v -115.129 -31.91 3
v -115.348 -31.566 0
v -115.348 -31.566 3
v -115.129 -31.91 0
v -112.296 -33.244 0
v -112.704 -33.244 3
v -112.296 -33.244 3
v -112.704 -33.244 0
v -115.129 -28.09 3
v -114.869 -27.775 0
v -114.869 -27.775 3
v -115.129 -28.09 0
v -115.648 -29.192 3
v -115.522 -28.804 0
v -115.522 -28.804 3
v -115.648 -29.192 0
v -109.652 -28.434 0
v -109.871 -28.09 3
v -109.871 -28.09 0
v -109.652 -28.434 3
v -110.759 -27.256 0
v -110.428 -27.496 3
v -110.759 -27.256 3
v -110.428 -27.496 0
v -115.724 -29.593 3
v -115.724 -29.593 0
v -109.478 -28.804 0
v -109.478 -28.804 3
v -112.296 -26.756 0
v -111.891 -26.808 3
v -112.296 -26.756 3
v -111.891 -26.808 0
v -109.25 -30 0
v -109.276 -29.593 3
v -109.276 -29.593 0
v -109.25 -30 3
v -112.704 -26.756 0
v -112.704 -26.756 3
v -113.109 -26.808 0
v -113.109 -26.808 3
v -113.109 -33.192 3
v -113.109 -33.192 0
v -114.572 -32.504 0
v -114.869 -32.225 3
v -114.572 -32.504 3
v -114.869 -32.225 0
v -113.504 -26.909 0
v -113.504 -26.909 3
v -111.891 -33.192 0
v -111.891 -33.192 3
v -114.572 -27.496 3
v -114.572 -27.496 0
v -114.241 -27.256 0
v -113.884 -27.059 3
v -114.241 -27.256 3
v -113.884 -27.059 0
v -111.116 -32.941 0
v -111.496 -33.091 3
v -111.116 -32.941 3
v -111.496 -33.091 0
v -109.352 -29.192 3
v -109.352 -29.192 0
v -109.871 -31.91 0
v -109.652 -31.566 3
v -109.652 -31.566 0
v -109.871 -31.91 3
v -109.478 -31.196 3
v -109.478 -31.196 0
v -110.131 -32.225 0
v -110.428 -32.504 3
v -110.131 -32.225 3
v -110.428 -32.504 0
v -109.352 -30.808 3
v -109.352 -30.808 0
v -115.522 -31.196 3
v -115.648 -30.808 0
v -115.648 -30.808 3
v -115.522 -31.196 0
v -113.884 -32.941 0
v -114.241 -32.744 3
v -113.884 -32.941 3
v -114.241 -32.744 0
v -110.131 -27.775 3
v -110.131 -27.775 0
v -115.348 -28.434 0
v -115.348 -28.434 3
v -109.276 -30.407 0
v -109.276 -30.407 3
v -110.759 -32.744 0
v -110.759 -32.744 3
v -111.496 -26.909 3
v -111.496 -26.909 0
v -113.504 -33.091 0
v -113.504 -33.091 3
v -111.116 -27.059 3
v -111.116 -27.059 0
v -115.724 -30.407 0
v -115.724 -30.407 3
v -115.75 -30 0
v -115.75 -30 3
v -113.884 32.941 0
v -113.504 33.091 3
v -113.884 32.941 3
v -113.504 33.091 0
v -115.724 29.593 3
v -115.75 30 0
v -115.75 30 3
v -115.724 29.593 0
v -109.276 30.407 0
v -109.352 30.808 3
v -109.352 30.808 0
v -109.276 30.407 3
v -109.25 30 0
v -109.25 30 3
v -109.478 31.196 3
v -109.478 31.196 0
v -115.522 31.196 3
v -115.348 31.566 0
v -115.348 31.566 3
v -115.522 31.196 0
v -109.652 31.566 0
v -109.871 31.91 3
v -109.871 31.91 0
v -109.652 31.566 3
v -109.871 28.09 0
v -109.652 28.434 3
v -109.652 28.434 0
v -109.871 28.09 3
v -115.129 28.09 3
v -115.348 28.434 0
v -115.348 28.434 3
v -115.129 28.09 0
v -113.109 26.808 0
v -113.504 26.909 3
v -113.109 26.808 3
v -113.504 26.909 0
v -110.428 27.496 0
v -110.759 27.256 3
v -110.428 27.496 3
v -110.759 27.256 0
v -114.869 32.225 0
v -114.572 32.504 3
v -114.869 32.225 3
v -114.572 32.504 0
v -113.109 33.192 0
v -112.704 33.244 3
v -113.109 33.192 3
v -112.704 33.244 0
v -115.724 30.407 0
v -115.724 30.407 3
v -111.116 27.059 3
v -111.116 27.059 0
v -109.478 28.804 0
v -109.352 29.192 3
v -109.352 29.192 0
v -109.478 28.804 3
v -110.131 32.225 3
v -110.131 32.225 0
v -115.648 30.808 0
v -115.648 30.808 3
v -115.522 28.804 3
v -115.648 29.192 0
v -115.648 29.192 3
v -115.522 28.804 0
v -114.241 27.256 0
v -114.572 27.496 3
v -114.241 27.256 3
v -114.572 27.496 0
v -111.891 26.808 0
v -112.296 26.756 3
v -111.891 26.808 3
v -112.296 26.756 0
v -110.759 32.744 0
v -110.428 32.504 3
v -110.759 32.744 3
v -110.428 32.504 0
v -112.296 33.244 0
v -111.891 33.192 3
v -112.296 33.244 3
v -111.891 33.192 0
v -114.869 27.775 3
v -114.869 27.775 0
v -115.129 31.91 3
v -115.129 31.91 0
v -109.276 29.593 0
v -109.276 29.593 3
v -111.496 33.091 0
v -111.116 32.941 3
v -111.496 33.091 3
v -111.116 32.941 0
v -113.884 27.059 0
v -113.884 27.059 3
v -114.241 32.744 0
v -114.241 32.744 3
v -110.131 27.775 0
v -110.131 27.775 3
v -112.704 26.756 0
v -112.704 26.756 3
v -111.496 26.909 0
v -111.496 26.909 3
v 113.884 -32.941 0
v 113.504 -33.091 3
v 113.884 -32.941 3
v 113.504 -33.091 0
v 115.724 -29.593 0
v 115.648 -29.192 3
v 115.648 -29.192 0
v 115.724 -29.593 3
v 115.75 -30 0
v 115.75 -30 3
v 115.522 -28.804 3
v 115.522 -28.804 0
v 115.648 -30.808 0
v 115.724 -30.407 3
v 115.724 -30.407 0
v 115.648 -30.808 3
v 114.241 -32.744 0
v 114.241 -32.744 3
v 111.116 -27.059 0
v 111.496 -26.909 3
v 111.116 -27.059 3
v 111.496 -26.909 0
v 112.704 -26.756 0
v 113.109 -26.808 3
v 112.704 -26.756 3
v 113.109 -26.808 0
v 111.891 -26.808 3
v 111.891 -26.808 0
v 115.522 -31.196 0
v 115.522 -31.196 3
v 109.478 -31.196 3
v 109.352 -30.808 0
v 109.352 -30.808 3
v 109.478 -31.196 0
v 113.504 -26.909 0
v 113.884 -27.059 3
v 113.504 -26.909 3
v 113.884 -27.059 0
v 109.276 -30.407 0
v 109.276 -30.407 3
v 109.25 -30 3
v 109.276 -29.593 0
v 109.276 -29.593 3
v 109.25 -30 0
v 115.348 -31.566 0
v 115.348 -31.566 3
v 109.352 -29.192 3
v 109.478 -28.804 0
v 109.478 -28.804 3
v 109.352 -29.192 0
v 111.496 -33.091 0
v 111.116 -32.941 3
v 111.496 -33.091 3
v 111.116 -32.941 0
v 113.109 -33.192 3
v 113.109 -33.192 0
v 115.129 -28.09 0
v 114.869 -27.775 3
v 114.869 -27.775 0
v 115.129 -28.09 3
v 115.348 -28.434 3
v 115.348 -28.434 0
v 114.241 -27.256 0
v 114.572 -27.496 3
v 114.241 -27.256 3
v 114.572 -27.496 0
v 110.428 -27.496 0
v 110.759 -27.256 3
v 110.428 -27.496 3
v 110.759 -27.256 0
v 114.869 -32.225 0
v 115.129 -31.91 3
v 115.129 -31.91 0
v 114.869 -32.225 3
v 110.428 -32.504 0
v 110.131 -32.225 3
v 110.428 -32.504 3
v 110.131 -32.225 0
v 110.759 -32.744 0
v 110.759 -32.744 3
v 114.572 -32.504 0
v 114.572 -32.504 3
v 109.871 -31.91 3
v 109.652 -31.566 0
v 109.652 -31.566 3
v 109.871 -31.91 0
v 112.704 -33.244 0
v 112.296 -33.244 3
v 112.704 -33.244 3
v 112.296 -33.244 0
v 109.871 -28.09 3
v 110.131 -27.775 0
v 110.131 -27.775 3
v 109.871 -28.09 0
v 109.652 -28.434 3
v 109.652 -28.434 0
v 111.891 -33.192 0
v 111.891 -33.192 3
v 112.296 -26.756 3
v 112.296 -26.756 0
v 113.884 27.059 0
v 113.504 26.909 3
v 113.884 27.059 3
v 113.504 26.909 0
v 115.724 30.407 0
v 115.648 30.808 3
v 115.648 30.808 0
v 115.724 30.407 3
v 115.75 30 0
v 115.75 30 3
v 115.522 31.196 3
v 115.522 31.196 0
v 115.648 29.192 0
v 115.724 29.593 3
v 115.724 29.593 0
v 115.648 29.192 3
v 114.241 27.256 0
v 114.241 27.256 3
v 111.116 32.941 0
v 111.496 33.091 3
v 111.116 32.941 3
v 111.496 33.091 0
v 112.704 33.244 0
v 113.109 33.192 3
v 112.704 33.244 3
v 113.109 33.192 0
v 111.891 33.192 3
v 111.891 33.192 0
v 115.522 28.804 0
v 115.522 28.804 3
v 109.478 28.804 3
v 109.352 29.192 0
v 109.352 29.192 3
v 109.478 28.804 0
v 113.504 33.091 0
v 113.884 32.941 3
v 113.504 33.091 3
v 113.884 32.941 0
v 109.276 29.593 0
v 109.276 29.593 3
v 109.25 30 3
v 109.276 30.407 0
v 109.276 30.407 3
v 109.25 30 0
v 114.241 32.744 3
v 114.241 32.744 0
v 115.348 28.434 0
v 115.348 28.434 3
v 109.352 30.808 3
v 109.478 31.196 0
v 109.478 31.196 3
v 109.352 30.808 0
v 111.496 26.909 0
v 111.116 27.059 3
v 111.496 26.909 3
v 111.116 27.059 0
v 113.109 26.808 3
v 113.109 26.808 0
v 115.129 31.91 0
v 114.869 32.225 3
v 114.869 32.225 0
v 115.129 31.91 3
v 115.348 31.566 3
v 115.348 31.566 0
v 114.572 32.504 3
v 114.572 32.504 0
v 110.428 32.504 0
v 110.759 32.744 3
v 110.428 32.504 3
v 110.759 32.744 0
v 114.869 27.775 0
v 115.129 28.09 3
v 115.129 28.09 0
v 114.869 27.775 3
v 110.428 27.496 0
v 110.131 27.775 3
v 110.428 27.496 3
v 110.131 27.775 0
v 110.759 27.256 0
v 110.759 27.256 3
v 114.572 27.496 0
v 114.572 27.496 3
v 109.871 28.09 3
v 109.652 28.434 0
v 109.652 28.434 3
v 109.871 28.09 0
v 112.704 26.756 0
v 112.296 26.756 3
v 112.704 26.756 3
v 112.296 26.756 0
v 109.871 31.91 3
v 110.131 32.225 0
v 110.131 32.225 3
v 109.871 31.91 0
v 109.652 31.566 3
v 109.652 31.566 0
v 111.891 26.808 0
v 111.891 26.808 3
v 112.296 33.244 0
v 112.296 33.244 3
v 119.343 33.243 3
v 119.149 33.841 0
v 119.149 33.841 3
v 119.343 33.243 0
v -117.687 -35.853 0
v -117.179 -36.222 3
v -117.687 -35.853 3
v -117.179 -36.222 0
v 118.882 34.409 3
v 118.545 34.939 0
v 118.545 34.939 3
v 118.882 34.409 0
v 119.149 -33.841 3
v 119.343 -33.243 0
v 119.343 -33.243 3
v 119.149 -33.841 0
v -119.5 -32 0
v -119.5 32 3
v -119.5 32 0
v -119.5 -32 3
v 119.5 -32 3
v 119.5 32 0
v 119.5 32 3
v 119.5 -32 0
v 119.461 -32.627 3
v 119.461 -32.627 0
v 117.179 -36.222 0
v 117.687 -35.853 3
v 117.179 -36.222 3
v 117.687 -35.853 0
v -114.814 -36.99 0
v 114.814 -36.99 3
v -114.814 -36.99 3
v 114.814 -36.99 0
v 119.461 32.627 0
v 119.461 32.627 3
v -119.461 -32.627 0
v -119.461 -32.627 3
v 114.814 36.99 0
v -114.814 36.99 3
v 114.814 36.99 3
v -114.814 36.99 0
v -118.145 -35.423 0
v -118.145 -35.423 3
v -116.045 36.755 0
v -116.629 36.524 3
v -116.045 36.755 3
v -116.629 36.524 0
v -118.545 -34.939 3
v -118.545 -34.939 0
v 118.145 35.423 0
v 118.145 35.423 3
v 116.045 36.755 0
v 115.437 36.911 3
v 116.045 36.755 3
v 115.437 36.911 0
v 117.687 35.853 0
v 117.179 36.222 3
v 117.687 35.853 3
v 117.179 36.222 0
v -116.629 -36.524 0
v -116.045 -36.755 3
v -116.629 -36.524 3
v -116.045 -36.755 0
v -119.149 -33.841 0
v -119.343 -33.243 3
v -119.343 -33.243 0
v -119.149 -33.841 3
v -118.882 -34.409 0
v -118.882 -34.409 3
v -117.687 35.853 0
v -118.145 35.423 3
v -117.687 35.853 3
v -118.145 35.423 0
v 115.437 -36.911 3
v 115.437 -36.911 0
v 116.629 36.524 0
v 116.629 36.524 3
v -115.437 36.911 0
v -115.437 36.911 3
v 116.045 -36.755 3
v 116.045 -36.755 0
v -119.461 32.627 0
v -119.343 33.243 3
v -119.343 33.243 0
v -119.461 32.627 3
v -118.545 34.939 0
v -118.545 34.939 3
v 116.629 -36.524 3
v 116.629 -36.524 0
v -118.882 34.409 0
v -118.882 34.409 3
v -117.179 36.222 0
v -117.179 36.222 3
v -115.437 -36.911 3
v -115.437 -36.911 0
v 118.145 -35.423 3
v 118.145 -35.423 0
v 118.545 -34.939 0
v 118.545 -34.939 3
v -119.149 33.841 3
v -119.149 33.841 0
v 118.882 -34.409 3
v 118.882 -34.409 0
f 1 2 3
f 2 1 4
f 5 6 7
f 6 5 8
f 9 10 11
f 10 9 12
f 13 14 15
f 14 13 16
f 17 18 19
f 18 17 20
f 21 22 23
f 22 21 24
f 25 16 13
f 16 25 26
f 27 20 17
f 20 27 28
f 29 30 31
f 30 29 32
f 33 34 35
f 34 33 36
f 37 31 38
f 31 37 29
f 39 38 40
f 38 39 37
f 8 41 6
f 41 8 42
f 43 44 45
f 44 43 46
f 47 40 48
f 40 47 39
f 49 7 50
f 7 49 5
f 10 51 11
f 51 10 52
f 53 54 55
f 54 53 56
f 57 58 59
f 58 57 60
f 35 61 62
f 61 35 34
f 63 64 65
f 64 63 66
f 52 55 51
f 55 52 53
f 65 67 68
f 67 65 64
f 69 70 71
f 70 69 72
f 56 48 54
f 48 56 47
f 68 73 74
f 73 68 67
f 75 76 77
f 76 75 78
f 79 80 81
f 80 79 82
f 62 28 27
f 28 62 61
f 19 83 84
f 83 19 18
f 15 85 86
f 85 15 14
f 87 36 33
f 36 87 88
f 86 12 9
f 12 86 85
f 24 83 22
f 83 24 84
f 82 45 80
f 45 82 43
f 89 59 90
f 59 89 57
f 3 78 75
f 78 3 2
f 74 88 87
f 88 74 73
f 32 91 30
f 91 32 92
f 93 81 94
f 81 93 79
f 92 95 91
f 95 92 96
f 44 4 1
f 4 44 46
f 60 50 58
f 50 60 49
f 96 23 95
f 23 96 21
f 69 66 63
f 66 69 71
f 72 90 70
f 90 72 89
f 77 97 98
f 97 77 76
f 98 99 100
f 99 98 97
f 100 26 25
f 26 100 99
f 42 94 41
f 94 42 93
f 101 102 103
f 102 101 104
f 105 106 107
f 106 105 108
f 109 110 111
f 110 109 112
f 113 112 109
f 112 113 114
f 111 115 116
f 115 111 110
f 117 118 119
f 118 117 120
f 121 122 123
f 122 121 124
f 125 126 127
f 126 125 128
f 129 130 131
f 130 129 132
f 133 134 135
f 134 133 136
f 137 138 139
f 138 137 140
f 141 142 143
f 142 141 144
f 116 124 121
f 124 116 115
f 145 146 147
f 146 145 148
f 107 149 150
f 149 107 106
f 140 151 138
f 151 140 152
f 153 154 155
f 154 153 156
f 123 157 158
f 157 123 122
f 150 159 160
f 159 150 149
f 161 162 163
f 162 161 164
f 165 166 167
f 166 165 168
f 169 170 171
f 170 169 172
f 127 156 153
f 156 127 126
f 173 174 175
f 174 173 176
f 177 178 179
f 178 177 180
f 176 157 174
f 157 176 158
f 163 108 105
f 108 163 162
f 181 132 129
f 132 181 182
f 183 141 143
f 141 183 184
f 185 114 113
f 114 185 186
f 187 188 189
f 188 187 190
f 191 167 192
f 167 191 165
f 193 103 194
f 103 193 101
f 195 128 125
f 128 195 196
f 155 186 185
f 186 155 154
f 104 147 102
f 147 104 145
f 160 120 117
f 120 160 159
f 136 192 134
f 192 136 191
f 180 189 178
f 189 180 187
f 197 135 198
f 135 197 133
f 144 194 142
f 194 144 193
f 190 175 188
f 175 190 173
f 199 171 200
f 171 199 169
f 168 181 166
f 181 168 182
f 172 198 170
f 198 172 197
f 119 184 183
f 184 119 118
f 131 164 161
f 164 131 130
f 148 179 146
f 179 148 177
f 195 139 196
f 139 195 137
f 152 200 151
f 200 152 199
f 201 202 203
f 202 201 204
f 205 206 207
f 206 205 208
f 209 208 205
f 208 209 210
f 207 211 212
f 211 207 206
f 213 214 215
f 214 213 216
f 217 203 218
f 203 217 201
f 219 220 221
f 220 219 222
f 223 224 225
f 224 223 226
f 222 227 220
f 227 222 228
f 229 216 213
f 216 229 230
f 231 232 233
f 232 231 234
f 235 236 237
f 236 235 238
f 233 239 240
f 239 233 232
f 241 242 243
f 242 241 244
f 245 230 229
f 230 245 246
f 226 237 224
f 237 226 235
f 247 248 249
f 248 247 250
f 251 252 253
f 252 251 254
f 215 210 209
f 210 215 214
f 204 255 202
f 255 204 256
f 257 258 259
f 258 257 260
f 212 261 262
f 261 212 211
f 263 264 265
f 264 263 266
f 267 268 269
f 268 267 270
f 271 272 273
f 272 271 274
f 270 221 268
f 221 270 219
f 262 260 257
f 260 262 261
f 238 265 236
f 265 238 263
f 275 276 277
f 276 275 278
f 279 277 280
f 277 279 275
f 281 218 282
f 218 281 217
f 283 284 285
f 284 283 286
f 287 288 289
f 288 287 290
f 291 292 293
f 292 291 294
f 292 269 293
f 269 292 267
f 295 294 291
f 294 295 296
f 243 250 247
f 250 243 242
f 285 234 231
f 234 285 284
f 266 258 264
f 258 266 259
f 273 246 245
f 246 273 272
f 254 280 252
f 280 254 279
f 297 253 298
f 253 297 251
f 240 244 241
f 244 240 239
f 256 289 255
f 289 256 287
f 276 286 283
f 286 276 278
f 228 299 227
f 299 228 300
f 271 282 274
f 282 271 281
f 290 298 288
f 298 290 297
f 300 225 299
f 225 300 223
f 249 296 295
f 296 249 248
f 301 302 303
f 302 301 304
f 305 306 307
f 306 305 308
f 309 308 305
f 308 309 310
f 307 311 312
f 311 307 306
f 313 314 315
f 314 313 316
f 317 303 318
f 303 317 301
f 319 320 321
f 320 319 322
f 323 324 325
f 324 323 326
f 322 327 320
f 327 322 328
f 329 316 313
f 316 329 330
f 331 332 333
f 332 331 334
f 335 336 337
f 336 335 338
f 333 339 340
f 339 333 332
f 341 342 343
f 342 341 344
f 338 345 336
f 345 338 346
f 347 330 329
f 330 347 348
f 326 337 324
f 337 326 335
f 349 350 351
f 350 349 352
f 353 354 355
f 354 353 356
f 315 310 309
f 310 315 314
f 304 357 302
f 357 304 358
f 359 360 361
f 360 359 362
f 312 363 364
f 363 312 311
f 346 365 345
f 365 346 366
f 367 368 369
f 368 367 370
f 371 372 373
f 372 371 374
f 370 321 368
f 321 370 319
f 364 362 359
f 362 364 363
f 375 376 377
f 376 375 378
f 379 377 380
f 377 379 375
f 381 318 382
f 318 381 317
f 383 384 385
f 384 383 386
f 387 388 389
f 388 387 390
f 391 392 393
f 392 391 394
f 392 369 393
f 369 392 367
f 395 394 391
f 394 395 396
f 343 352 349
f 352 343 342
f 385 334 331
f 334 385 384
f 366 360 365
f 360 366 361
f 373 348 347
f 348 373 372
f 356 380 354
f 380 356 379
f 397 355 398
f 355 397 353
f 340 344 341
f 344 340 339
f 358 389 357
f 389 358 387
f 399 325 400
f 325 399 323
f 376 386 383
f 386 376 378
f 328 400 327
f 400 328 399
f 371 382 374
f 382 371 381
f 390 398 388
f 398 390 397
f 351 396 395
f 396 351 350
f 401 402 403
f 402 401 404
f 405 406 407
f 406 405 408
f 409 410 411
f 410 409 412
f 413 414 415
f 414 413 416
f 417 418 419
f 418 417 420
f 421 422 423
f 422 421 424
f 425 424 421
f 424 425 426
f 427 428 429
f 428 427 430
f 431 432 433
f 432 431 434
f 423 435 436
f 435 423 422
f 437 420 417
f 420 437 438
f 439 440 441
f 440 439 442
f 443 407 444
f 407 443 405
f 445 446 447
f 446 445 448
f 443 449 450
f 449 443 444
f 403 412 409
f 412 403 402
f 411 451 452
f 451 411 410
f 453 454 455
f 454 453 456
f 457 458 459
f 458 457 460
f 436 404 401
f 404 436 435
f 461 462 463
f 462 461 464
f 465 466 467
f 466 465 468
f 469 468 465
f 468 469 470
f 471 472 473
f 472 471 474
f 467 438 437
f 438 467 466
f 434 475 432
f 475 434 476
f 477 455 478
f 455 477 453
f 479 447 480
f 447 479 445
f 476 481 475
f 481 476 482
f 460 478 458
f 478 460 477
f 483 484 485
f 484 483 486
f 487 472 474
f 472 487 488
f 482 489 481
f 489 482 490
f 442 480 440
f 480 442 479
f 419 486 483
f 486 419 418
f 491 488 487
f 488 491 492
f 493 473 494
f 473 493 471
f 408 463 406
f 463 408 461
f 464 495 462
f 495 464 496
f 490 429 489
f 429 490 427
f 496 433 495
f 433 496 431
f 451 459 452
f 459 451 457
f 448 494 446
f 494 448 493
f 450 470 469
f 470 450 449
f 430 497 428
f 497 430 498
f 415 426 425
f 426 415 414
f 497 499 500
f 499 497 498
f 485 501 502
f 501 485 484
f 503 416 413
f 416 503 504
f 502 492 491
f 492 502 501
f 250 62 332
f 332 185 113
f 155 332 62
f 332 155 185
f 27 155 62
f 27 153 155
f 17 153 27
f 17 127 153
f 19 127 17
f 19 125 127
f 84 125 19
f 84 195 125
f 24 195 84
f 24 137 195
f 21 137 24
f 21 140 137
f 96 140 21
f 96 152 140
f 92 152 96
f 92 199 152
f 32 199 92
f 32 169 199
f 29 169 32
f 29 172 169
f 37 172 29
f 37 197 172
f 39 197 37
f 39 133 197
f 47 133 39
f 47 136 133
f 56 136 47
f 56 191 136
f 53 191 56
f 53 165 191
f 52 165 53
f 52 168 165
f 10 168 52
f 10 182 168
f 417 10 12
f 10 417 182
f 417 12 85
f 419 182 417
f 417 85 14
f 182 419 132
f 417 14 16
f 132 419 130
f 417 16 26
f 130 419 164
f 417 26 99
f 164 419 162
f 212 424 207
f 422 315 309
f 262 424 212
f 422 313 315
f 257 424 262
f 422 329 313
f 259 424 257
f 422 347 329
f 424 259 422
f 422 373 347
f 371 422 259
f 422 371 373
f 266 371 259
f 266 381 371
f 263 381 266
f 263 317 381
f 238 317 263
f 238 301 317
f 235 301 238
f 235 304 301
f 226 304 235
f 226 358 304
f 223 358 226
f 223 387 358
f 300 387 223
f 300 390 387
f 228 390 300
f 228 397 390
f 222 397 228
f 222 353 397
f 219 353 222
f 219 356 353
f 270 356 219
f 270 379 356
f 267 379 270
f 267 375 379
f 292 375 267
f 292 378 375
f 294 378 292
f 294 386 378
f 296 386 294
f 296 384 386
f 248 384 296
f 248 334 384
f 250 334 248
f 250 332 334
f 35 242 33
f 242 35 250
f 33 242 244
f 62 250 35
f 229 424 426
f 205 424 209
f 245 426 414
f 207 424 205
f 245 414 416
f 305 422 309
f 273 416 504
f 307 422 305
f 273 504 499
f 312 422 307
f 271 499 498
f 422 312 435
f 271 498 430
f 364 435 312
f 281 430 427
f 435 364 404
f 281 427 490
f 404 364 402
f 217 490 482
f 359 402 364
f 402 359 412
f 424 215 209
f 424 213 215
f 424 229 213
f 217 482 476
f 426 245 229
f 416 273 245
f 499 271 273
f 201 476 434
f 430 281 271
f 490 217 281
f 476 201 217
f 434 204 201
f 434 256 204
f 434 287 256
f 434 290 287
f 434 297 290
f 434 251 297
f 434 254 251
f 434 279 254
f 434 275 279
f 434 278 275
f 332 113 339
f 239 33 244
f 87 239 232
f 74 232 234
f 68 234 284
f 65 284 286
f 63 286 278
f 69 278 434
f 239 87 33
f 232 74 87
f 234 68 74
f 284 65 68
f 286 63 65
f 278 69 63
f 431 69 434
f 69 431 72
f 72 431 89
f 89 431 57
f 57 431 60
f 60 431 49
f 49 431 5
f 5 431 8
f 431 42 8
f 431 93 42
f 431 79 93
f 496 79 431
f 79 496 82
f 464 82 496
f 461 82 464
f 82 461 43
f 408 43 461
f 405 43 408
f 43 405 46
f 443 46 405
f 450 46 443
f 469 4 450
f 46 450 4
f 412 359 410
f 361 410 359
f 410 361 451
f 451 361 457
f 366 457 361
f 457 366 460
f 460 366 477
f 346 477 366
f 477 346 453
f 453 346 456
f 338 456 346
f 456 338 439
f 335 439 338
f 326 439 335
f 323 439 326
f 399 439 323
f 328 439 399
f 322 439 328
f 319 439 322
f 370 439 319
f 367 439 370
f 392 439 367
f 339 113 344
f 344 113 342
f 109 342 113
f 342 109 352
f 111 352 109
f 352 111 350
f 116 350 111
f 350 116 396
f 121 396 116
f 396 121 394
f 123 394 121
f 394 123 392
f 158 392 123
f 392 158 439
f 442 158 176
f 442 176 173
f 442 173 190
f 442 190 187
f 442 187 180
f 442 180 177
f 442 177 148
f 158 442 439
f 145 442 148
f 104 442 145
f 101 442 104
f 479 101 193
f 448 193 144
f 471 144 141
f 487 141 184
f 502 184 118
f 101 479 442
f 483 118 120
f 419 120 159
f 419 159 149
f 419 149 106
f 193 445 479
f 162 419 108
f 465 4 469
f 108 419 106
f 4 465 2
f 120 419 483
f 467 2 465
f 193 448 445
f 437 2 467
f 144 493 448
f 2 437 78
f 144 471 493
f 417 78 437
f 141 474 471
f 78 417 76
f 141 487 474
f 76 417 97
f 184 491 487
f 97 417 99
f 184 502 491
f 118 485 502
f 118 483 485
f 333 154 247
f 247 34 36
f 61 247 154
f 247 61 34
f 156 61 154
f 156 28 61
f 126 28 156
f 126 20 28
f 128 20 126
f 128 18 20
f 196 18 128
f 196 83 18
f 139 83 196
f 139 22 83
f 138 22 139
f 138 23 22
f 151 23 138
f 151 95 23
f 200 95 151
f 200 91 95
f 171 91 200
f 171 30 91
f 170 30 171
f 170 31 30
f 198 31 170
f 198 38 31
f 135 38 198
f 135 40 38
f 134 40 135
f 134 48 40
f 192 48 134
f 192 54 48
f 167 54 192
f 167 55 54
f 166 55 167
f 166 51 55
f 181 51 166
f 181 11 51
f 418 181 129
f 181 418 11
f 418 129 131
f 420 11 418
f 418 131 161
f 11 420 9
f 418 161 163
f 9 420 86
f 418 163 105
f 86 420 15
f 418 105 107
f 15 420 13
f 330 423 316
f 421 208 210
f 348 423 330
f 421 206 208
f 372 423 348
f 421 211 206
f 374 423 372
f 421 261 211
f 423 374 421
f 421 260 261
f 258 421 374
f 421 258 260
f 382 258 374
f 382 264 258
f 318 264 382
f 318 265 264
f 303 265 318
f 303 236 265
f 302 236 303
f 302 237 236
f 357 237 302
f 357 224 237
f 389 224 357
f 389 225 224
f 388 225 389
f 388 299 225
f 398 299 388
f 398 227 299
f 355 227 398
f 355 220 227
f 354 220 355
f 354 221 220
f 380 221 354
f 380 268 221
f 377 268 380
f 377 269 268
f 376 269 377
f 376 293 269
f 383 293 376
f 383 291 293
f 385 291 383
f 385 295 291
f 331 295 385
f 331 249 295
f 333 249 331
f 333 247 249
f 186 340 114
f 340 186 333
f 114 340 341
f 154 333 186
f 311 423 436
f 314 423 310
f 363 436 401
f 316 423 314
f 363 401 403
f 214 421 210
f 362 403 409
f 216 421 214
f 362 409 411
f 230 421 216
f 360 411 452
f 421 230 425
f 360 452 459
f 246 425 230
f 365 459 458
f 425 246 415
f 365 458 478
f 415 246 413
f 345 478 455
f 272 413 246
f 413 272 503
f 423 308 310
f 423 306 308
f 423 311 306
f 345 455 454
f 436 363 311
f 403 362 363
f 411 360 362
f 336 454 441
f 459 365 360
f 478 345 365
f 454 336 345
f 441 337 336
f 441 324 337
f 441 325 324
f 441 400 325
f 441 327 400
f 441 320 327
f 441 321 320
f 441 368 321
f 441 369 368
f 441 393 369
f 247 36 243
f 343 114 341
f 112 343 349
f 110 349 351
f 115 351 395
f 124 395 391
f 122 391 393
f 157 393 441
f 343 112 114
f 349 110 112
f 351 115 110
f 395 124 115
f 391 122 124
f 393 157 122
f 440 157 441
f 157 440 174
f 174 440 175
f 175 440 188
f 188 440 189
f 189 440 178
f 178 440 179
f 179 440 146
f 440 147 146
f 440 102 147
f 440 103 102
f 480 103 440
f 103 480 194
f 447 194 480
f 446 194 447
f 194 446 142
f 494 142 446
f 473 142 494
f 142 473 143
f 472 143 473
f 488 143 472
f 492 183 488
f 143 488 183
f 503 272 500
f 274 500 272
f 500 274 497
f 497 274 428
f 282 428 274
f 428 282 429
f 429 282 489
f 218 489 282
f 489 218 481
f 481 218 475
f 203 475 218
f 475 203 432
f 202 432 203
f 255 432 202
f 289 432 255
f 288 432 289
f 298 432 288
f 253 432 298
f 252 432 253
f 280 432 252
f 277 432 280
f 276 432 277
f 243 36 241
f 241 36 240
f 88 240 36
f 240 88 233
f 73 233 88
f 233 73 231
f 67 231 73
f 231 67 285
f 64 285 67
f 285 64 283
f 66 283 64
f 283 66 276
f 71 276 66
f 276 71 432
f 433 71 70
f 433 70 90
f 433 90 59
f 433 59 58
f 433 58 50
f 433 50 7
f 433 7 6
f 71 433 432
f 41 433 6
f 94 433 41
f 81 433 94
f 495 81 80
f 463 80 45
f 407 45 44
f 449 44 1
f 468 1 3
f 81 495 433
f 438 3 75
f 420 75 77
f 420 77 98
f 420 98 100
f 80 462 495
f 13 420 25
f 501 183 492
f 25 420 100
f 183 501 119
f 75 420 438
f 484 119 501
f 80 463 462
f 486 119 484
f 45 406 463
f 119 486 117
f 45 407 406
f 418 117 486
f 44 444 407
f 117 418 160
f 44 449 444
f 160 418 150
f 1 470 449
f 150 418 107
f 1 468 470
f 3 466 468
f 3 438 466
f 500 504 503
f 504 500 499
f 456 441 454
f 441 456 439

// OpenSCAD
$fn = 50;


difference() {
	union() {
		hull() {
			translate(v = [-114.5000000000, 32.0000000000, 0]) {
				cylinder(h = 3, r = 5);
			}
			translate(v = [114.5000000000, 32.0000000000, 0]) {
				cylinder(h = 3, r = 5);
			}
			translate(v = [-114.5000000000, -32.0000000000, 0]) {
				cylinder(h = 3, r = 5);
			}
			translate(v = [114.5000000000, -32.0000000000, 0]) {
				cylinder(h = 3, r = 5);
			}
		}
	}
	union() {
		translate(v = [-112.5000000000, -30.0000000000, -100.0000000000]) {
			cylinder(h = 200, r = 3.2500000000);
		}
		translate(v = [-112.5000000000, 30.0000000000, -100.0000000000]) {
			cylinder(h = 200, r = 3.2500000000);
		}
		translate(v = [112.5000000000, -30.0000000000, -100.0000000000]) {
			cylinder(h = 200, r = 3.2500000000);
		}
		translate(v = [112.5000000000, 30.0000000000, -100.0000000000]) {
			cylinder(h = 200, r = 3.2500000000);
		}
	}
}
